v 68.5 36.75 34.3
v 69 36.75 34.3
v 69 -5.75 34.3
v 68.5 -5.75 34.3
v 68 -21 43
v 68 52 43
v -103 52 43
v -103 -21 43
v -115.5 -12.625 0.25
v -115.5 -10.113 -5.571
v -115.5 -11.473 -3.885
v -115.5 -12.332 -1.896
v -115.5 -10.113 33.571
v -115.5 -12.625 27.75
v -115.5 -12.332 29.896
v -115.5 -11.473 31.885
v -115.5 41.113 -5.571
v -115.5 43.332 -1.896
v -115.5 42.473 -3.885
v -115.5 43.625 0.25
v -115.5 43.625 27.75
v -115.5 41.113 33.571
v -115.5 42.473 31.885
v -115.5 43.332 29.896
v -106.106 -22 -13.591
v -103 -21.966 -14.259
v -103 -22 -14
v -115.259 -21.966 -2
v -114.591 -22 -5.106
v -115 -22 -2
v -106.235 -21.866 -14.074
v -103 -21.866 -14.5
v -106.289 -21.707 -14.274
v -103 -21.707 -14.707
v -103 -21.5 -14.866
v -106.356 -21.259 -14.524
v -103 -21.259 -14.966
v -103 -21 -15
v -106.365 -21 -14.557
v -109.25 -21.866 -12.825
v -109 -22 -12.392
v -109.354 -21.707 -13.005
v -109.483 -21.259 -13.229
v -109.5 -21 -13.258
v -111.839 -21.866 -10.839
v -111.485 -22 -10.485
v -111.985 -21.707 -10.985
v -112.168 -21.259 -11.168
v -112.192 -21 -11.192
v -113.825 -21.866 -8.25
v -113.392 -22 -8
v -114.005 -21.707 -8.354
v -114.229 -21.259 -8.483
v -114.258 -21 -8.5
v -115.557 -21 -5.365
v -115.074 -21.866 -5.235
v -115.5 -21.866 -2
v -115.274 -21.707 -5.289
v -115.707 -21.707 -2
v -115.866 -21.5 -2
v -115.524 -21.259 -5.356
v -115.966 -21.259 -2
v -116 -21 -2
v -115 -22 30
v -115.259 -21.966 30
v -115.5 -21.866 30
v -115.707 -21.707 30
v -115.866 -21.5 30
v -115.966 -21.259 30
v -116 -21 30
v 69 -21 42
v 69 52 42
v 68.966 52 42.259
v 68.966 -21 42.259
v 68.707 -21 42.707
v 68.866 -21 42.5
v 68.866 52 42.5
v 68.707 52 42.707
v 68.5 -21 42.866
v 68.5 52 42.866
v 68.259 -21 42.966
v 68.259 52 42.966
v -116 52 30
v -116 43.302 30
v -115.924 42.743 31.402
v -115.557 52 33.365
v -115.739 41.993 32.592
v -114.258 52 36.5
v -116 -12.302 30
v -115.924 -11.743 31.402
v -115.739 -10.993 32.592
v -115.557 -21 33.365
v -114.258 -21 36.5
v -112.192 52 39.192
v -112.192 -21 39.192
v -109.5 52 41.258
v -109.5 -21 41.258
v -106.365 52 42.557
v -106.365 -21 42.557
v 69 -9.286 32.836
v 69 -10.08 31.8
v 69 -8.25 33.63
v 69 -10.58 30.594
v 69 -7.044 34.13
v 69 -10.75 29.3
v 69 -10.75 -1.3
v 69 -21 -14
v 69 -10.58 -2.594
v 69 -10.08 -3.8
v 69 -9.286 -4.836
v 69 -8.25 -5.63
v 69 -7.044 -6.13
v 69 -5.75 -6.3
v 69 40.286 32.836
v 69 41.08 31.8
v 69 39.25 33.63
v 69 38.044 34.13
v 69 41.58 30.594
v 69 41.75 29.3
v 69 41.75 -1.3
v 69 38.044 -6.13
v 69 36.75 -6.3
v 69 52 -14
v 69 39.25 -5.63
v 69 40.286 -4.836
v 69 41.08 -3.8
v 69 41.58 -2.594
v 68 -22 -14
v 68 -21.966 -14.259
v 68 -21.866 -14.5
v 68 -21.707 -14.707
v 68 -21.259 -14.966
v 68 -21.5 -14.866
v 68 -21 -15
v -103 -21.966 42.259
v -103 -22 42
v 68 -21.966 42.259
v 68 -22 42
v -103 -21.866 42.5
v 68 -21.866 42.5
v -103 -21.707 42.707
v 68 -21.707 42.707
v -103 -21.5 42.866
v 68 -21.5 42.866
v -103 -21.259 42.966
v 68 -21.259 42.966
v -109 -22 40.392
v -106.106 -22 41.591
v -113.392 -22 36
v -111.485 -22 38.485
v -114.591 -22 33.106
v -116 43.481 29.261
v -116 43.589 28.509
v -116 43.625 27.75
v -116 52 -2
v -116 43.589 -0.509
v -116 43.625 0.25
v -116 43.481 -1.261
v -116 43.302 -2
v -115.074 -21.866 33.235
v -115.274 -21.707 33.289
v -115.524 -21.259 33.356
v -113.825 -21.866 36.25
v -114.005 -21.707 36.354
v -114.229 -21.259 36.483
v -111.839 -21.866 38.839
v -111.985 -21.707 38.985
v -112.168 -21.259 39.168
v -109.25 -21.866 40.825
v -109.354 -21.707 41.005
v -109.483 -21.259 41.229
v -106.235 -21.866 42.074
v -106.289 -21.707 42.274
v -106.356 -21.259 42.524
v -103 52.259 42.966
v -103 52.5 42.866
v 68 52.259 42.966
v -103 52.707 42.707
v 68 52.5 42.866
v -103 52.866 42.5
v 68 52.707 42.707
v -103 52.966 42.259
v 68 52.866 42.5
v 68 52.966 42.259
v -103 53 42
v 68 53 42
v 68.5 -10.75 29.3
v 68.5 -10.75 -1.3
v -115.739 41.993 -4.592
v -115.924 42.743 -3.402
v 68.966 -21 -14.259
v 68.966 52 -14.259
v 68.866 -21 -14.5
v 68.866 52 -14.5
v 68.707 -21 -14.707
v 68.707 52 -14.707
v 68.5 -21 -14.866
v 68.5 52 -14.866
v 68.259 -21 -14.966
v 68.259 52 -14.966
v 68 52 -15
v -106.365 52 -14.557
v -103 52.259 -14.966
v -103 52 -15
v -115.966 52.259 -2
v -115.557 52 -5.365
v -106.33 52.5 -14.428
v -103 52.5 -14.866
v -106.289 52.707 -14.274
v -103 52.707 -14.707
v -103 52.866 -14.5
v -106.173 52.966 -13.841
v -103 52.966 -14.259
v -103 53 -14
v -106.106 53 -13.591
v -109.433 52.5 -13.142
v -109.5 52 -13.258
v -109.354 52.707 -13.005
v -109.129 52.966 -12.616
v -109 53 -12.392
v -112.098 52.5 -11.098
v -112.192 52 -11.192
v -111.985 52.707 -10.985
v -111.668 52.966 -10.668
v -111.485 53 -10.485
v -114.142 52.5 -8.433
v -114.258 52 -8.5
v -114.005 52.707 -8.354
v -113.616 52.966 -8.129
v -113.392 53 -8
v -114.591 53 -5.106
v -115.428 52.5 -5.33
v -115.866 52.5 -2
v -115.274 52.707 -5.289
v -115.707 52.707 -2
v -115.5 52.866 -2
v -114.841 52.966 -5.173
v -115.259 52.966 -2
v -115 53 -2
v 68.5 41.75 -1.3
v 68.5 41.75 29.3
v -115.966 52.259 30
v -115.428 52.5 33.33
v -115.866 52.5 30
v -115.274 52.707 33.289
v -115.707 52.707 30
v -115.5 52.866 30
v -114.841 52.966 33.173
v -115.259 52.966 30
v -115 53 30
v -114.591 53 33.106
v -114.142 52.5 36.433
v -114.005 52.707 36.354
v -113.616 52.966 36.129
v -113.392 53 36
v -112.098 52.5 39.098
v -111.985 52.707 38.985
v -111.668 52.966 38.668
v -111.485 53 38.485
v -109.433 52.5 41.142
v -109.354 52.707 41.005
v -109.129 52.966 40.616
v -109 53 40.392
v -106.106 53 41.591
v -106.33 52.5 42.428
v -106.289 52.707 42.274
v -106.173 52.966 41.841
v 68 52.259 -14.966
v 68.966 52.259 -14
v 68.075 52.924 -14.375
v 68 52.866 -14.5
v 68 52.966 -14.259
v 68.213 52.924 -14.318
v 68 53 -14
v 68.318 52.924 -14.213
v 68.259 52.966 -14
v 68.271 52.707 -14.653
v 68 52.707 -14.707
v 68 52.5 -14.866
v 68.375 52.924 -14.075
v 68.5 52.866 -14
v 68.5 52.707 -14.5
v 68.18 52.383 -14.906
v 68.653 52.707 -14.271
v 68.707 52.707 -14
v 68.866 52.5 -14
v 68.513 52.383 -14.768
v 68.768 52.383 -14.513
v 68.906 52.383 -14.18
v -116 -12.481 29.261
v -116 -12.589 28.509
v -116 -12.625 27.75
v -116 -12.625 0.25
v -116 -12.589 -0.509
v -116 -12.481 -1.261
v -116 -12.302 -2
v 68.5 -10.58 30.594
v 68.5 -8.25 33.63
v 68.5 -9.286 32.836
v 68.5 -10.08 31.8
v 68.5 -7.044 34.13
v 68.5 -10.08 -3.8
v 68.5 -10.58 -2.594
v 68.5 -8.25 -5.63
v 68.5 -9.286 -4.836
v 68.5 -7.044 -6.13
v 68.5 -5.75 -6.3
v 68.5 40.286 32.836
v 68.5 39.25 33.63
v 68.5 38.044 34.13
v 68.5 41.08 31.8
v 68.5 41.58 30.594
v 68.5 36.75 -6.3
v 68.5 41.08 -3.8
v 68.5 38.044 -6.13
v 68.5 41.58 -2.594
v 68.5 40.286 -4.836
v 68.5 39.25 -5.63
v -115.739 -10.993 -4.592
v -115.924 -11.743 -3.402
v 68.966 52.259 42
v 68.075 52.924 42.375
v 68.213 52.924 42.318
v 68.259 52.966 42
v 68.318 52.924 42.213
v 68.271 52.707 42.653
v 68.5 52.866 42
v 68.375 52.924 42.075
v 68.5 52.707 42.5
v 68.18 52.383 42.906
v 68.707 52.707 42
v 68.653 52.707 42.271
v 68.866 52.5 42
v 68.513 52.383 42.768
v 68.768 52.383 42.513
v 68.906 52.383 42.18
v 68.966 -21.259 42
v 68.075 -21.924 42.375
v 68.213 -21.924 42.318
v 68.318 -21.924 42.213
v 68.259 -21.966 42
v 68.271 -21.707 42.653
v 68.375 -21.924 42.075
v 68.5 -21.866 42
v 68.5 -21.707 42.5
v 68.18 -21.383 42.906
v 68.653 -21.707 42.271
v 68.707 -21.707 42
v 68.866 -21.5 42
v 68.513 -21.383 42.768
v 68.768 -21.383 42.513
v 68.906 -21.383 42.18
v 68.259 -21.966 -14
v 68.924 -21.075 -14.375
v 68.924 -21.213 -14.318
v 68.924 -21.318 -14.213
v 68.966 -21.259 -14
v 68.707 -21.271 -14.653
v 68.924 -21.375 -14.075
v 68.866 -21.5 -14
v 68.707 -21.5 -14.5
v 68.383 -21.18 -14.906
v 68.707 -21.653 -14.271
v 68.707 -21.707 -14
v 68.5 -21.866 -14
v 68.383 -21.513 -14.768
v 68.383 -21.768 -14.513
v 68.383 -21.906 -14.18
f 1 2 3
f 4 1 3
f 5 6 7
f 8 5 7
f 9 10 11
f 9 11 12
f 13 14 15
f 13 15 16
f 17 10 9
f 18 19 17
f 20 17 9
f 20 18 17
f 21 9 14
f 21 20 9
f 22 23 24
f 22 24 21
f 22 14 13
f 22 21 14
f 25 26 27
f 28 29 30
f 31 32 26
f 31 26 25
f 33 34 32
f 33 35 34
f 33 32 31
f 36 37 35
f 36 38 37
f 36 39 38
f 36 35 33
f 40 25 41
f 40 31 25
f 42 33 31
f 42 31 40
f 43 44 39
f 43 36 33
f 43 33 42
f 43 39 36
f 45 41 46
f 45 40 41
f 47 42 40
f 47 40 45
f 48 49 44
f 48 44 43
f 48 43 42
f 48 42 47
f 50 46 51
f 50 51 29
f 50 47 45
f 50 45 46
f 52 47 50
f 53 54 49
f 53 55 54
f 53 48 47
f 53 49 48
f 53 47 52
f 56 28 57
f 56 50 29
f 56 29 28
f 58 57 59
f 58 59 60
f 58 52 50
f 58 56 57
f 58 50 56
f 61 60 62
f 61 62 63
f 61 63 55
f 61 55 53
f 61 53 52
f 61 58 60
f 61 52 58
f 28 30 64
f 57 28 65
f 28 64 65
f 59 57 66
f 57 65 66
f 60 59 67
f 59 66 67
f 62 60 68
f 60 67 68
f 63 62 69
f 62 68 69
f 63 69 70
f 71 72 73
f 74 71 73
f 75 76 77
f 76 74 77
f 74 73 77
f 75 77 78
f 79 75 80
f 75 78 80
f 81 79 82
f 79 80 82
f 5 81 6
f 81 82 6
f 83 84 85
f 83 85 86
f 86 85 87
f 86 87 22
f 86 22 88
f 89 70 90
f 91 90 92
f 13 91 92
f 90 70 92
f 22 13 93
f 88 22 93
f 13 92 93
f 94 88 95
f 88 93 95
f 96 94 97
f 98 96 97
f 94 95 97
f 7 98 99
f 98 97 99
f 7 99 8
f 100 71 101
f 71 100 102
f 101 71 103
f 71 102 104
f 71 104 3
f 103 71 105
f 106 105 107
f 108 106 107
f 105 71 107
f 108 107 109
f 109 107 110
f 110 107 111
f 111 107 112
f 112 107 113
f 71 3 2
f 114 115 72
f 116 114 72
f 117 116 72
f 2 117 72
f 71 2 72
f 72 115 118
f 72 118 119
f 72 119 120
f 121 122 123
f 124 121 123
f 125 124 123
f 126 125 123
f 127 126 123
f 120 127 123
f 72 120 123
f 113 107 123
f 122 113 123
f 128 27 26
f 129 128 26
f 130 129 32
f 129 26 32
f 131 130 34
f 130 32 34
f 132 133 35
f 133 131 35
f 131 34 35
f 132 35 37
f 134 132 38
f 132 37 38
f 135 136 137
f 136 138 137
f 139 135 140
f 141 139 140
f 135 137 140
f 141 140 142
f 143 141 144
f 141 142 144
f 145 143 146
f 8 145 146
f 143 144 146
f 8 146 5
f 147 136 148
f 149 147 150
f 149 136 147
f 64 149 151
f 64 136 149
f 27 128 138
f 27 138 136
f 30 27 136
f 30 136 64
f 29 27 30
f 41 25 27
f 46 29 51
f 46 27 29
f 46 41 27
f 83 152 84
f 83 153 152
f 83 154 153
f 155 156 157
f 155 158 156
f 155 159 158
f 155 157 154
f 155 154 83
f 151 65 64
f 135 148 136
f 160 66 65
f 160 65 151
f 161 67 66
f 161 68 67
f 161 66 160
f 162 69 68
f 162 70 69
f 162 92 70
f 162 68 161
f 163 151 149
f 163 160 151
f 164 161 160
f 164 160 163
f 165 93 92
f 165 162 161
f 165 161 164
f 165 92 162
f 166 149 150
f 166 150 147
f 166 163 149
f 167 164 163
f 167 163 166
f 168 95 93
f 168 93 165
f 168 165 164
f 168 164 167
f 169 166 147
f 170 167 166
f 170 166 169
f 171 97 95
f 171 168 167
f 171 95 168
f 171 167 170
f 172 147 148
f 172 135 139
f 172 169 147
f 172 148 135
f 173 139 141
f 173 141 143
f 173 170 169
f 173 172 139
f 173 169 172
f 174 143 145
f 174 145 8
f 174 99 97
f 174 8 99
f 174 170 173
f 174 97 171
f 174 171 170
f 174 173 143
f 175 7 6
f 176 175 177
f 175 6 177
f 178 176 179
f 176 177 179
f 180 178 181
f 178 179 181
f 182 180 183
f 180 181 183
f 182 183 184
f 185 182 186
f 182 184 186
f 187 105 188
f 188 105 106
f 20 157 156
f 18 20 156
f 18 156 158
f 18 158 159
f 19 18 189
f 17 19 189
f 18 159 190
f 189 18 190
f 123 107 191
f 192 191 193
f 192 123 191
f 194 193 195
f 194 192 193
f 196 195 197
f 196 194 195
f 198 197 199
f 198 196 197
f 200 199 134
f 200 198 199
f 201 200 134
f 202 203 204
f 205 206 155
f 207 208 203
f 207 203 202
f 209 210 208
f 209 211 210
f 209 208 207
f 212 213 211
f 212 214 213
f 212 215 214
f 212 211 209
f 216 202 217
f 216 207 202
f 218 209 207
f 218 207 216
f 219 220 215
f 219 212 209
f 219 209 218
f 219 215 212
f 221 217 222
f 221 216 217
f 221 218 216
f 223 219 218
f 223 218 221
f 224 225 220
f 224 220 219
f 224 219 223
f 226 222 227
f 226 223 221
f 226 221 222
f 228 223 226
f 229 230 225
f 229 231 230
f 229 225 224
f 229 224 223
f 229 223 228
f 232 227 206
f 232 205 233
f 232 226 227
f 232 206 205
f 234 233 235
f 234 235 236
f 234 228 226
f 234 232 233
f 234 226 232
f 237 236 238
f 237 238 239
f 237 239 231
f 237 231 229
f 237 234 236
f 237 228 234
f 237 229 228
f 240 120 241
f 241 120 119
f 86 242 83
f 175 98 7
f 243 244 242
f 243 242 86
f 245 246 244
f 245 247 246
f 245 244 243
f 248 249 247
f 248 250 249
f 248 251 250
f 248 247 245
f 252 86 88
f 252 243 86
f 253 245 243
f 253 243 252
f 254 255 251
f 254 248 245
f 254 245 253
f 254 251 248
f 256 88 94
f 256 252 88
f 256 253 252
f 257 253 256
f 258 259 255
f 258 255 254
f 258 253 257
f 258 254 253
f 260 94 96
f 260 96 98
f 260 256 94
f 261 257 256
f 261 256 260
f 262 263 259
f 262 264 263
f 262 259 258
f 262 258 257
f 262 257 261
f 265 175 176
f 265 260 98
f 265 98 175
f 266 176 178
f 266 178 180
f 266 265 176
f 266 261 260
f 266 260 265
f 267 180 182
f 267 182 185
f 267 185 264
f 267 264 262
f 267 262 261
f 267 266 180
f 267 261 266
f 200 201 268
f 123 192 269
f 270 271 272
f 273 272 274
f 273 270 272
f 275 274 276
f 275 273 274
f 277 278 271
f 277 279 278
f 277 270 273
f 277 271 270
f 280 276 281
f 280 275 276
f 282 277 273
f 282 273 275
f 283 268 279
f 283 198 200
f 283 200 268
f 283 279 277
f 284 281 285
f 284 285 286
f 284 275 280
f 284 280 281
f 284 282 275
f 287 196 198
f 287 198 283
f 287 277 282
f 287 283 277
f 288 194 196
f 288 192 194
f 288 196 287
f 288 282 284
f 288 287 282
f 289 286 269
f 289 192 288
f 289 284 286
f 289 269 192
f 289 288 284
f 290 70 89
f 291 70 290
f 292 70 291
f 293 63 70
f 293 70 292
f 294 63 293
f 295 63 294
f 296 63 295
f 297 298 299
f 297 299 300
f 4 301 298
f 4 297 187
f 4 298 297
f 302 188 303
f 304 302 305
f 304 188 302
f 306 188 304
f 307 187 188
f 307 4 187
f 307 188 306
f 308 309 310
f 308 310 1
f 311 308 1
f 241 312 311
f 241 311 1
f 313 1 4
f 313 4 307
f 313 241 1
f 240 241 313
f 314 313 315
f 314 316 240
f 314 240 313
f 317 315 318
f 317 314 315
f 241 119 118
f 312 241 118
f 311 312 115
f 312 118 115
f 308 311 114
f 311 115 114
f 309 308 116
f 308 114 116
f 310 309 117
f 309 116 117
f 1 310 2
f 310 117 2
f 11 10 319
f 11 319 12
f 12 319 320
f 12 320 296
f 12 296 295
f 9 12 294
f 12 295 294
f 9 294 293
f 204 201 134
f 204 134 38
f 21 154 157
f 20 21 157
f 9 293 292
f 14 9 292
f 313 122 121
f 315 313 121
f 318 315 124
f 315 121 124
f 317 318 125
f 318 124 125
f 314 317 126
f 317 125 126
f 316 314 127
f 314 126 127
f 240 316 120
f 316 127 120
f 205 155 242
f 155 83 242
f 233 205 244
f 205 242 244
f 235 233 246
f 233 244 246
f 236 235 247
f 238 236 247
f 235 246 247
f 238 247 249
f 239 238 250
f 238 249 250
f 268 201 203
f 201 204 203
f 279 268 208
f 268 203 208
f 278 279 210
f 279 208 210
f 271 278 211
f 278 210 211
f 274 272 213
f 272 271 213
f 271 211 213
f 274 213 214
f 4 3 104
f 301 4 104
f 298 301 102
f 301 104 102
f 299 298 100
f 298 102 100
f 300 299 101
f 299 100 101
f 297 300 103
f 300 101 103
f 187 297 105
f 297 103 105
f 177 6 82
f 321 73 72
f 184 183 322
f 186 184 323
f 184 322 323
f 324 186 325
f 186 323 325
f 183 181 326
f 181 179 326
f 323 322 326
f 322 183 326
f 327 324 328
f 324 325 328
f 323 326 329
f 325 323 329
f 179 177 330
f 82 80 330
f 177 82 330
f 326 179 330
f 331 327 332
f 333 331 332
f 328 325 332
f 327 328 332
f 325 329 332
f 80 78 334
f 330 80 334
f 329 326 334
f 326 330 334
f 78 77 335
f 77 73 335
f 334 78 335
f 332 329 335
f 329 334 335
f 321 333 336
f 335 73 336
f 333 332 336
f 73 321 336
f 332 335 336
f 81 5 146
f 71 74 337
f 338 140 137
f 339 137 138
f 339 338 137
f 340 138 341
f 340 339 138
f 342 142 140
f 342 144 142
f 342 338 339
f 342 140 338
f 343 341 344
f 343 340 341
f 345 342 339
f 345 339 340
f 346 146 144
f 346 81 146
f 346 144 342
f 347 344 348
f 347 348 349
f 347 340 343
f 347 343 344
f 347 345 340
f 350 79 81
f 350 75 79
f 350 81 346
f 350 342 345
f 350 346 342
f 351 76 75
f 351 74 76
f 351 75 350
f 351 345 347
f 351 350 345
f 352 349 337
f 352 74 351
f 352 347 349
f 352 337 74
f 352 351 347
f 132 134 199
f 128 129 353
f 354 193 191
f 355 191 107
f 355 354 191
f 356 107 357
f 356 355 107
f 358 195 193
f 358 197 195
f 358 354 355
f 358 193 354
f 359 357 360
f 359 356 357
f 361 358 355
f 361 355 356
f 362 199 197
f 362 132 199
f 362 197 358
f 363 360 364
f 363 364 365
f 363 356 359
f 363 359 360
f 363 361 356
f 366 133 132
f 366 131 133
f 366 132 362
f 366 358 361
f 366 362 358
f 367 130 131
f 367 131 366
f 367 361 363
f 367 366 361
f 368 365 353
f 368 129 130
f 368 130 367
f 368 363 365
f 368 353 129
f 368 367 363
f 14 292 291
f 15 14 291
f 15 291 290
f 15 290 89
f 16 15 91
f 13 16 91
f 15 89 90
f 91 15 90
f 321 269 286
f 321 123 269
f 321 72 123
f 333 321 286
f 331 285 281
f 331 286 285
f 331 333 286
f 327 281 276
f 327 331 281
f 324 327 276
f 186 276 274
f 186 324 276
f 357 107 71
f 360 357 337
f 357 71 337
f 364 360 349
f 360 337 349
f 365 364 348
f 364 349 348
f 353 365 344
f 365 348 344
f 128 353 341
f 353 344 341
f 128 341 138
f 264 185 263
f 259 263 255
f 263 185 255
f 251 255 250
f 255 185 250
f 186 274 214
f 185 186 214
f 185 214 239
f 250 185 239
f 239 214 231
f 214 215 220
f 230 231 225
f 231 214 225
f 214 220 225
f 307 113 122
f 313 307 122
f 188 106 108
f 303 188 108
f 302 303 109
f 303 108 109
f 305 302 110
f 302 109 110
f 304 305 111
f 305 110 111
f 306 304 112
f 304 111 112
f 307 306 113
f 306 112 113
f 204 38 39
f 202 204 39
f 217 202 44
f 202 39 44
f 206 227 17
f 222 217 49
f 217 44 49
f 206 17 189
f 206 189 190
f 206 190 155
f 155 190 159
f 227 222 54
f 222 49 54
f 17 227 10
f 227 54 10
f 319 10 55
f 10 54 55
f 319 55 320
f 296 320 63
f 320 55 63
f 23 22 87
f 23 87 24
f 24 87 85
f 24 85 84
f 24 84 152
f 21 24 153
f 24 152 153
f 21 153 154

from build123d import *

# Parameters (mm, degrees)
SKETCH1_W           = 185
SKETCH1_H           = 75
BOSS_EXTRUDE1_DEPTH = 58
CUT_EXTRUDE1_DEPTH  = 0.5
CUT_EXTRUDE2_DEPTH  = 0.5
FILLET1_R           = 13
FILLET2_R           = 1


with BuildPart() as part:
    # Sketch1 → Boss-Extrude1 (new body)
    with BuildSketch(Plane(origin=(0, 0, -15), x_dir=(-1, 0, 0), z_dir=(0, 0, -1))):
        with Locations((23.5, 15.5)):
            Rectangle(SKETCH1_W, SKETCH1_H)
    extrude(amount=-BOSS_EXTRUDE1_DEPTH)

    # Sketch2 → Cut-Extrude1 (cut)
    with BuildSketch(Plane(origin=(69, 0, 0), x_dir=(0, 0, -1), z_dir=(1, 0, 0))):
        with BuildLine():
            Line((-34.3, 36.75), (-34.3, -5.75))
            ThreePointArc((-34.3, -5.75), (-32.835533906, -9.285533906), (-29.3, -10.75))
            Line((-29.3, -10.75), (1.3, -10.75))
            ThreePointArc((1.3, -10.75), (4.835533906, -9.285533906), (6.3, -5.75))
            Line((6.3, -5.75), (6.3, 36.75))
            ThreePointArc((6.3, 36.75), (4.835533906, 40.285533906), (1.3, 41.75))
            Line((1.3, 41.75), (-29.3, 41.75))
            ThreePointArc((-29.3, 41.75), (-32.835533906, 40.285533906), (-34.3, 36.75))
        make_face()
    extrude(amount=-CUT_EXTRUDE1_DEPTH, mode=Mode.SUBTRACT)

    # Sketch3 → Cut-Extrude2 (cut)
    with BuildSketch(Plane.ZY.offset(116)):
        with BuildLine():
            Line((27.75, 43.625), (0.25, 43.625))
            ThreePointArc((0.25, 43.625), (-5.406854249, 41.281854249), (-7.75, 35.625))
            Line((-7.75, 35.625), (-7.75, -4.625))
            ThreePointArc((-7.75, -4.625), (-5.406854249, -10.281854249), (0.25, -12.625))
            Line((0.25, -12.625), (27.75, -12.625))
            ThreePointArc((27.75, -12.625), (33.406854249, -10.281854249), (35.75, -4.625))
            Line((35.75, -4.625), (35.75, 35.625))
            ThreePointArc((35.75, 35.625), (33.406854249, 41.281854249), (27.75, 43.625))
        make_face()
    extrude(amount=-CUT_EXTRUDE2_DEPTH, mode=Mode.SUBTRACT)

    # Fillet1
    # the kernel refuses this fillet: 13 mm, written as the material it takes off along each edge
    with BuildSketch(Plane(origin=(-116, -54.5, -15), x_dir=(0, 0, 1), z_dir=(0, 1, 0))) as fillet1_piece_1:
        with BuildLine():
            CenterArc((FILLET1_R, FILLET1_R), FILLET1_R, 180, 90)
            Line((0, FILLET1_R), (0, 0))
            Line((0, 0), (FILLET1_R, 0))
        make_face()
    extrude(amount=140, mode=Mode.SUBTRACT)
    with BuildSketch(Plane(origin=(-116, -54.5, 43), x_dir=(0, 0, -1), z_dir=(0, 1, 0))) as fillet1_piece_2:
        with BuildLine():
            CenterArc((FILLET1_R, -FILLET1_R), FILLET1_R, 90, 90)
            Line((0, -FILLET1_R), (0, 0))
            Line((0, 0), (FILLET1_R, 0))
        make_face()
    extrude(amount=140, mode=Mode.SUBTRACT)

    # Fillet2
    fillet2_edges = [part.edges().sort_by_distance(p)[0] for p in [
        (69, 15.5, 43),
        (-17, -22, -15),
        (69, 15.5, -15),
        (-17, 53, -15),
        (-116, 53, 14),
        (-17, 53, 43),
        (-112.192388155, 53, 39.192388155),
        (-112.192388155, 53, -11.192388155),
        (-116, -22, 14),
        (-17, -22, 43),
        (-112.192388155, -22, 39.192388155),
        (69, 53, 14),
        (-112.192388155, -22, -11.192388155),
        (69, -22, 14),
    ]]
    fillet(fillet2_edges, radius=FILLET2_R)


solid = part.part
